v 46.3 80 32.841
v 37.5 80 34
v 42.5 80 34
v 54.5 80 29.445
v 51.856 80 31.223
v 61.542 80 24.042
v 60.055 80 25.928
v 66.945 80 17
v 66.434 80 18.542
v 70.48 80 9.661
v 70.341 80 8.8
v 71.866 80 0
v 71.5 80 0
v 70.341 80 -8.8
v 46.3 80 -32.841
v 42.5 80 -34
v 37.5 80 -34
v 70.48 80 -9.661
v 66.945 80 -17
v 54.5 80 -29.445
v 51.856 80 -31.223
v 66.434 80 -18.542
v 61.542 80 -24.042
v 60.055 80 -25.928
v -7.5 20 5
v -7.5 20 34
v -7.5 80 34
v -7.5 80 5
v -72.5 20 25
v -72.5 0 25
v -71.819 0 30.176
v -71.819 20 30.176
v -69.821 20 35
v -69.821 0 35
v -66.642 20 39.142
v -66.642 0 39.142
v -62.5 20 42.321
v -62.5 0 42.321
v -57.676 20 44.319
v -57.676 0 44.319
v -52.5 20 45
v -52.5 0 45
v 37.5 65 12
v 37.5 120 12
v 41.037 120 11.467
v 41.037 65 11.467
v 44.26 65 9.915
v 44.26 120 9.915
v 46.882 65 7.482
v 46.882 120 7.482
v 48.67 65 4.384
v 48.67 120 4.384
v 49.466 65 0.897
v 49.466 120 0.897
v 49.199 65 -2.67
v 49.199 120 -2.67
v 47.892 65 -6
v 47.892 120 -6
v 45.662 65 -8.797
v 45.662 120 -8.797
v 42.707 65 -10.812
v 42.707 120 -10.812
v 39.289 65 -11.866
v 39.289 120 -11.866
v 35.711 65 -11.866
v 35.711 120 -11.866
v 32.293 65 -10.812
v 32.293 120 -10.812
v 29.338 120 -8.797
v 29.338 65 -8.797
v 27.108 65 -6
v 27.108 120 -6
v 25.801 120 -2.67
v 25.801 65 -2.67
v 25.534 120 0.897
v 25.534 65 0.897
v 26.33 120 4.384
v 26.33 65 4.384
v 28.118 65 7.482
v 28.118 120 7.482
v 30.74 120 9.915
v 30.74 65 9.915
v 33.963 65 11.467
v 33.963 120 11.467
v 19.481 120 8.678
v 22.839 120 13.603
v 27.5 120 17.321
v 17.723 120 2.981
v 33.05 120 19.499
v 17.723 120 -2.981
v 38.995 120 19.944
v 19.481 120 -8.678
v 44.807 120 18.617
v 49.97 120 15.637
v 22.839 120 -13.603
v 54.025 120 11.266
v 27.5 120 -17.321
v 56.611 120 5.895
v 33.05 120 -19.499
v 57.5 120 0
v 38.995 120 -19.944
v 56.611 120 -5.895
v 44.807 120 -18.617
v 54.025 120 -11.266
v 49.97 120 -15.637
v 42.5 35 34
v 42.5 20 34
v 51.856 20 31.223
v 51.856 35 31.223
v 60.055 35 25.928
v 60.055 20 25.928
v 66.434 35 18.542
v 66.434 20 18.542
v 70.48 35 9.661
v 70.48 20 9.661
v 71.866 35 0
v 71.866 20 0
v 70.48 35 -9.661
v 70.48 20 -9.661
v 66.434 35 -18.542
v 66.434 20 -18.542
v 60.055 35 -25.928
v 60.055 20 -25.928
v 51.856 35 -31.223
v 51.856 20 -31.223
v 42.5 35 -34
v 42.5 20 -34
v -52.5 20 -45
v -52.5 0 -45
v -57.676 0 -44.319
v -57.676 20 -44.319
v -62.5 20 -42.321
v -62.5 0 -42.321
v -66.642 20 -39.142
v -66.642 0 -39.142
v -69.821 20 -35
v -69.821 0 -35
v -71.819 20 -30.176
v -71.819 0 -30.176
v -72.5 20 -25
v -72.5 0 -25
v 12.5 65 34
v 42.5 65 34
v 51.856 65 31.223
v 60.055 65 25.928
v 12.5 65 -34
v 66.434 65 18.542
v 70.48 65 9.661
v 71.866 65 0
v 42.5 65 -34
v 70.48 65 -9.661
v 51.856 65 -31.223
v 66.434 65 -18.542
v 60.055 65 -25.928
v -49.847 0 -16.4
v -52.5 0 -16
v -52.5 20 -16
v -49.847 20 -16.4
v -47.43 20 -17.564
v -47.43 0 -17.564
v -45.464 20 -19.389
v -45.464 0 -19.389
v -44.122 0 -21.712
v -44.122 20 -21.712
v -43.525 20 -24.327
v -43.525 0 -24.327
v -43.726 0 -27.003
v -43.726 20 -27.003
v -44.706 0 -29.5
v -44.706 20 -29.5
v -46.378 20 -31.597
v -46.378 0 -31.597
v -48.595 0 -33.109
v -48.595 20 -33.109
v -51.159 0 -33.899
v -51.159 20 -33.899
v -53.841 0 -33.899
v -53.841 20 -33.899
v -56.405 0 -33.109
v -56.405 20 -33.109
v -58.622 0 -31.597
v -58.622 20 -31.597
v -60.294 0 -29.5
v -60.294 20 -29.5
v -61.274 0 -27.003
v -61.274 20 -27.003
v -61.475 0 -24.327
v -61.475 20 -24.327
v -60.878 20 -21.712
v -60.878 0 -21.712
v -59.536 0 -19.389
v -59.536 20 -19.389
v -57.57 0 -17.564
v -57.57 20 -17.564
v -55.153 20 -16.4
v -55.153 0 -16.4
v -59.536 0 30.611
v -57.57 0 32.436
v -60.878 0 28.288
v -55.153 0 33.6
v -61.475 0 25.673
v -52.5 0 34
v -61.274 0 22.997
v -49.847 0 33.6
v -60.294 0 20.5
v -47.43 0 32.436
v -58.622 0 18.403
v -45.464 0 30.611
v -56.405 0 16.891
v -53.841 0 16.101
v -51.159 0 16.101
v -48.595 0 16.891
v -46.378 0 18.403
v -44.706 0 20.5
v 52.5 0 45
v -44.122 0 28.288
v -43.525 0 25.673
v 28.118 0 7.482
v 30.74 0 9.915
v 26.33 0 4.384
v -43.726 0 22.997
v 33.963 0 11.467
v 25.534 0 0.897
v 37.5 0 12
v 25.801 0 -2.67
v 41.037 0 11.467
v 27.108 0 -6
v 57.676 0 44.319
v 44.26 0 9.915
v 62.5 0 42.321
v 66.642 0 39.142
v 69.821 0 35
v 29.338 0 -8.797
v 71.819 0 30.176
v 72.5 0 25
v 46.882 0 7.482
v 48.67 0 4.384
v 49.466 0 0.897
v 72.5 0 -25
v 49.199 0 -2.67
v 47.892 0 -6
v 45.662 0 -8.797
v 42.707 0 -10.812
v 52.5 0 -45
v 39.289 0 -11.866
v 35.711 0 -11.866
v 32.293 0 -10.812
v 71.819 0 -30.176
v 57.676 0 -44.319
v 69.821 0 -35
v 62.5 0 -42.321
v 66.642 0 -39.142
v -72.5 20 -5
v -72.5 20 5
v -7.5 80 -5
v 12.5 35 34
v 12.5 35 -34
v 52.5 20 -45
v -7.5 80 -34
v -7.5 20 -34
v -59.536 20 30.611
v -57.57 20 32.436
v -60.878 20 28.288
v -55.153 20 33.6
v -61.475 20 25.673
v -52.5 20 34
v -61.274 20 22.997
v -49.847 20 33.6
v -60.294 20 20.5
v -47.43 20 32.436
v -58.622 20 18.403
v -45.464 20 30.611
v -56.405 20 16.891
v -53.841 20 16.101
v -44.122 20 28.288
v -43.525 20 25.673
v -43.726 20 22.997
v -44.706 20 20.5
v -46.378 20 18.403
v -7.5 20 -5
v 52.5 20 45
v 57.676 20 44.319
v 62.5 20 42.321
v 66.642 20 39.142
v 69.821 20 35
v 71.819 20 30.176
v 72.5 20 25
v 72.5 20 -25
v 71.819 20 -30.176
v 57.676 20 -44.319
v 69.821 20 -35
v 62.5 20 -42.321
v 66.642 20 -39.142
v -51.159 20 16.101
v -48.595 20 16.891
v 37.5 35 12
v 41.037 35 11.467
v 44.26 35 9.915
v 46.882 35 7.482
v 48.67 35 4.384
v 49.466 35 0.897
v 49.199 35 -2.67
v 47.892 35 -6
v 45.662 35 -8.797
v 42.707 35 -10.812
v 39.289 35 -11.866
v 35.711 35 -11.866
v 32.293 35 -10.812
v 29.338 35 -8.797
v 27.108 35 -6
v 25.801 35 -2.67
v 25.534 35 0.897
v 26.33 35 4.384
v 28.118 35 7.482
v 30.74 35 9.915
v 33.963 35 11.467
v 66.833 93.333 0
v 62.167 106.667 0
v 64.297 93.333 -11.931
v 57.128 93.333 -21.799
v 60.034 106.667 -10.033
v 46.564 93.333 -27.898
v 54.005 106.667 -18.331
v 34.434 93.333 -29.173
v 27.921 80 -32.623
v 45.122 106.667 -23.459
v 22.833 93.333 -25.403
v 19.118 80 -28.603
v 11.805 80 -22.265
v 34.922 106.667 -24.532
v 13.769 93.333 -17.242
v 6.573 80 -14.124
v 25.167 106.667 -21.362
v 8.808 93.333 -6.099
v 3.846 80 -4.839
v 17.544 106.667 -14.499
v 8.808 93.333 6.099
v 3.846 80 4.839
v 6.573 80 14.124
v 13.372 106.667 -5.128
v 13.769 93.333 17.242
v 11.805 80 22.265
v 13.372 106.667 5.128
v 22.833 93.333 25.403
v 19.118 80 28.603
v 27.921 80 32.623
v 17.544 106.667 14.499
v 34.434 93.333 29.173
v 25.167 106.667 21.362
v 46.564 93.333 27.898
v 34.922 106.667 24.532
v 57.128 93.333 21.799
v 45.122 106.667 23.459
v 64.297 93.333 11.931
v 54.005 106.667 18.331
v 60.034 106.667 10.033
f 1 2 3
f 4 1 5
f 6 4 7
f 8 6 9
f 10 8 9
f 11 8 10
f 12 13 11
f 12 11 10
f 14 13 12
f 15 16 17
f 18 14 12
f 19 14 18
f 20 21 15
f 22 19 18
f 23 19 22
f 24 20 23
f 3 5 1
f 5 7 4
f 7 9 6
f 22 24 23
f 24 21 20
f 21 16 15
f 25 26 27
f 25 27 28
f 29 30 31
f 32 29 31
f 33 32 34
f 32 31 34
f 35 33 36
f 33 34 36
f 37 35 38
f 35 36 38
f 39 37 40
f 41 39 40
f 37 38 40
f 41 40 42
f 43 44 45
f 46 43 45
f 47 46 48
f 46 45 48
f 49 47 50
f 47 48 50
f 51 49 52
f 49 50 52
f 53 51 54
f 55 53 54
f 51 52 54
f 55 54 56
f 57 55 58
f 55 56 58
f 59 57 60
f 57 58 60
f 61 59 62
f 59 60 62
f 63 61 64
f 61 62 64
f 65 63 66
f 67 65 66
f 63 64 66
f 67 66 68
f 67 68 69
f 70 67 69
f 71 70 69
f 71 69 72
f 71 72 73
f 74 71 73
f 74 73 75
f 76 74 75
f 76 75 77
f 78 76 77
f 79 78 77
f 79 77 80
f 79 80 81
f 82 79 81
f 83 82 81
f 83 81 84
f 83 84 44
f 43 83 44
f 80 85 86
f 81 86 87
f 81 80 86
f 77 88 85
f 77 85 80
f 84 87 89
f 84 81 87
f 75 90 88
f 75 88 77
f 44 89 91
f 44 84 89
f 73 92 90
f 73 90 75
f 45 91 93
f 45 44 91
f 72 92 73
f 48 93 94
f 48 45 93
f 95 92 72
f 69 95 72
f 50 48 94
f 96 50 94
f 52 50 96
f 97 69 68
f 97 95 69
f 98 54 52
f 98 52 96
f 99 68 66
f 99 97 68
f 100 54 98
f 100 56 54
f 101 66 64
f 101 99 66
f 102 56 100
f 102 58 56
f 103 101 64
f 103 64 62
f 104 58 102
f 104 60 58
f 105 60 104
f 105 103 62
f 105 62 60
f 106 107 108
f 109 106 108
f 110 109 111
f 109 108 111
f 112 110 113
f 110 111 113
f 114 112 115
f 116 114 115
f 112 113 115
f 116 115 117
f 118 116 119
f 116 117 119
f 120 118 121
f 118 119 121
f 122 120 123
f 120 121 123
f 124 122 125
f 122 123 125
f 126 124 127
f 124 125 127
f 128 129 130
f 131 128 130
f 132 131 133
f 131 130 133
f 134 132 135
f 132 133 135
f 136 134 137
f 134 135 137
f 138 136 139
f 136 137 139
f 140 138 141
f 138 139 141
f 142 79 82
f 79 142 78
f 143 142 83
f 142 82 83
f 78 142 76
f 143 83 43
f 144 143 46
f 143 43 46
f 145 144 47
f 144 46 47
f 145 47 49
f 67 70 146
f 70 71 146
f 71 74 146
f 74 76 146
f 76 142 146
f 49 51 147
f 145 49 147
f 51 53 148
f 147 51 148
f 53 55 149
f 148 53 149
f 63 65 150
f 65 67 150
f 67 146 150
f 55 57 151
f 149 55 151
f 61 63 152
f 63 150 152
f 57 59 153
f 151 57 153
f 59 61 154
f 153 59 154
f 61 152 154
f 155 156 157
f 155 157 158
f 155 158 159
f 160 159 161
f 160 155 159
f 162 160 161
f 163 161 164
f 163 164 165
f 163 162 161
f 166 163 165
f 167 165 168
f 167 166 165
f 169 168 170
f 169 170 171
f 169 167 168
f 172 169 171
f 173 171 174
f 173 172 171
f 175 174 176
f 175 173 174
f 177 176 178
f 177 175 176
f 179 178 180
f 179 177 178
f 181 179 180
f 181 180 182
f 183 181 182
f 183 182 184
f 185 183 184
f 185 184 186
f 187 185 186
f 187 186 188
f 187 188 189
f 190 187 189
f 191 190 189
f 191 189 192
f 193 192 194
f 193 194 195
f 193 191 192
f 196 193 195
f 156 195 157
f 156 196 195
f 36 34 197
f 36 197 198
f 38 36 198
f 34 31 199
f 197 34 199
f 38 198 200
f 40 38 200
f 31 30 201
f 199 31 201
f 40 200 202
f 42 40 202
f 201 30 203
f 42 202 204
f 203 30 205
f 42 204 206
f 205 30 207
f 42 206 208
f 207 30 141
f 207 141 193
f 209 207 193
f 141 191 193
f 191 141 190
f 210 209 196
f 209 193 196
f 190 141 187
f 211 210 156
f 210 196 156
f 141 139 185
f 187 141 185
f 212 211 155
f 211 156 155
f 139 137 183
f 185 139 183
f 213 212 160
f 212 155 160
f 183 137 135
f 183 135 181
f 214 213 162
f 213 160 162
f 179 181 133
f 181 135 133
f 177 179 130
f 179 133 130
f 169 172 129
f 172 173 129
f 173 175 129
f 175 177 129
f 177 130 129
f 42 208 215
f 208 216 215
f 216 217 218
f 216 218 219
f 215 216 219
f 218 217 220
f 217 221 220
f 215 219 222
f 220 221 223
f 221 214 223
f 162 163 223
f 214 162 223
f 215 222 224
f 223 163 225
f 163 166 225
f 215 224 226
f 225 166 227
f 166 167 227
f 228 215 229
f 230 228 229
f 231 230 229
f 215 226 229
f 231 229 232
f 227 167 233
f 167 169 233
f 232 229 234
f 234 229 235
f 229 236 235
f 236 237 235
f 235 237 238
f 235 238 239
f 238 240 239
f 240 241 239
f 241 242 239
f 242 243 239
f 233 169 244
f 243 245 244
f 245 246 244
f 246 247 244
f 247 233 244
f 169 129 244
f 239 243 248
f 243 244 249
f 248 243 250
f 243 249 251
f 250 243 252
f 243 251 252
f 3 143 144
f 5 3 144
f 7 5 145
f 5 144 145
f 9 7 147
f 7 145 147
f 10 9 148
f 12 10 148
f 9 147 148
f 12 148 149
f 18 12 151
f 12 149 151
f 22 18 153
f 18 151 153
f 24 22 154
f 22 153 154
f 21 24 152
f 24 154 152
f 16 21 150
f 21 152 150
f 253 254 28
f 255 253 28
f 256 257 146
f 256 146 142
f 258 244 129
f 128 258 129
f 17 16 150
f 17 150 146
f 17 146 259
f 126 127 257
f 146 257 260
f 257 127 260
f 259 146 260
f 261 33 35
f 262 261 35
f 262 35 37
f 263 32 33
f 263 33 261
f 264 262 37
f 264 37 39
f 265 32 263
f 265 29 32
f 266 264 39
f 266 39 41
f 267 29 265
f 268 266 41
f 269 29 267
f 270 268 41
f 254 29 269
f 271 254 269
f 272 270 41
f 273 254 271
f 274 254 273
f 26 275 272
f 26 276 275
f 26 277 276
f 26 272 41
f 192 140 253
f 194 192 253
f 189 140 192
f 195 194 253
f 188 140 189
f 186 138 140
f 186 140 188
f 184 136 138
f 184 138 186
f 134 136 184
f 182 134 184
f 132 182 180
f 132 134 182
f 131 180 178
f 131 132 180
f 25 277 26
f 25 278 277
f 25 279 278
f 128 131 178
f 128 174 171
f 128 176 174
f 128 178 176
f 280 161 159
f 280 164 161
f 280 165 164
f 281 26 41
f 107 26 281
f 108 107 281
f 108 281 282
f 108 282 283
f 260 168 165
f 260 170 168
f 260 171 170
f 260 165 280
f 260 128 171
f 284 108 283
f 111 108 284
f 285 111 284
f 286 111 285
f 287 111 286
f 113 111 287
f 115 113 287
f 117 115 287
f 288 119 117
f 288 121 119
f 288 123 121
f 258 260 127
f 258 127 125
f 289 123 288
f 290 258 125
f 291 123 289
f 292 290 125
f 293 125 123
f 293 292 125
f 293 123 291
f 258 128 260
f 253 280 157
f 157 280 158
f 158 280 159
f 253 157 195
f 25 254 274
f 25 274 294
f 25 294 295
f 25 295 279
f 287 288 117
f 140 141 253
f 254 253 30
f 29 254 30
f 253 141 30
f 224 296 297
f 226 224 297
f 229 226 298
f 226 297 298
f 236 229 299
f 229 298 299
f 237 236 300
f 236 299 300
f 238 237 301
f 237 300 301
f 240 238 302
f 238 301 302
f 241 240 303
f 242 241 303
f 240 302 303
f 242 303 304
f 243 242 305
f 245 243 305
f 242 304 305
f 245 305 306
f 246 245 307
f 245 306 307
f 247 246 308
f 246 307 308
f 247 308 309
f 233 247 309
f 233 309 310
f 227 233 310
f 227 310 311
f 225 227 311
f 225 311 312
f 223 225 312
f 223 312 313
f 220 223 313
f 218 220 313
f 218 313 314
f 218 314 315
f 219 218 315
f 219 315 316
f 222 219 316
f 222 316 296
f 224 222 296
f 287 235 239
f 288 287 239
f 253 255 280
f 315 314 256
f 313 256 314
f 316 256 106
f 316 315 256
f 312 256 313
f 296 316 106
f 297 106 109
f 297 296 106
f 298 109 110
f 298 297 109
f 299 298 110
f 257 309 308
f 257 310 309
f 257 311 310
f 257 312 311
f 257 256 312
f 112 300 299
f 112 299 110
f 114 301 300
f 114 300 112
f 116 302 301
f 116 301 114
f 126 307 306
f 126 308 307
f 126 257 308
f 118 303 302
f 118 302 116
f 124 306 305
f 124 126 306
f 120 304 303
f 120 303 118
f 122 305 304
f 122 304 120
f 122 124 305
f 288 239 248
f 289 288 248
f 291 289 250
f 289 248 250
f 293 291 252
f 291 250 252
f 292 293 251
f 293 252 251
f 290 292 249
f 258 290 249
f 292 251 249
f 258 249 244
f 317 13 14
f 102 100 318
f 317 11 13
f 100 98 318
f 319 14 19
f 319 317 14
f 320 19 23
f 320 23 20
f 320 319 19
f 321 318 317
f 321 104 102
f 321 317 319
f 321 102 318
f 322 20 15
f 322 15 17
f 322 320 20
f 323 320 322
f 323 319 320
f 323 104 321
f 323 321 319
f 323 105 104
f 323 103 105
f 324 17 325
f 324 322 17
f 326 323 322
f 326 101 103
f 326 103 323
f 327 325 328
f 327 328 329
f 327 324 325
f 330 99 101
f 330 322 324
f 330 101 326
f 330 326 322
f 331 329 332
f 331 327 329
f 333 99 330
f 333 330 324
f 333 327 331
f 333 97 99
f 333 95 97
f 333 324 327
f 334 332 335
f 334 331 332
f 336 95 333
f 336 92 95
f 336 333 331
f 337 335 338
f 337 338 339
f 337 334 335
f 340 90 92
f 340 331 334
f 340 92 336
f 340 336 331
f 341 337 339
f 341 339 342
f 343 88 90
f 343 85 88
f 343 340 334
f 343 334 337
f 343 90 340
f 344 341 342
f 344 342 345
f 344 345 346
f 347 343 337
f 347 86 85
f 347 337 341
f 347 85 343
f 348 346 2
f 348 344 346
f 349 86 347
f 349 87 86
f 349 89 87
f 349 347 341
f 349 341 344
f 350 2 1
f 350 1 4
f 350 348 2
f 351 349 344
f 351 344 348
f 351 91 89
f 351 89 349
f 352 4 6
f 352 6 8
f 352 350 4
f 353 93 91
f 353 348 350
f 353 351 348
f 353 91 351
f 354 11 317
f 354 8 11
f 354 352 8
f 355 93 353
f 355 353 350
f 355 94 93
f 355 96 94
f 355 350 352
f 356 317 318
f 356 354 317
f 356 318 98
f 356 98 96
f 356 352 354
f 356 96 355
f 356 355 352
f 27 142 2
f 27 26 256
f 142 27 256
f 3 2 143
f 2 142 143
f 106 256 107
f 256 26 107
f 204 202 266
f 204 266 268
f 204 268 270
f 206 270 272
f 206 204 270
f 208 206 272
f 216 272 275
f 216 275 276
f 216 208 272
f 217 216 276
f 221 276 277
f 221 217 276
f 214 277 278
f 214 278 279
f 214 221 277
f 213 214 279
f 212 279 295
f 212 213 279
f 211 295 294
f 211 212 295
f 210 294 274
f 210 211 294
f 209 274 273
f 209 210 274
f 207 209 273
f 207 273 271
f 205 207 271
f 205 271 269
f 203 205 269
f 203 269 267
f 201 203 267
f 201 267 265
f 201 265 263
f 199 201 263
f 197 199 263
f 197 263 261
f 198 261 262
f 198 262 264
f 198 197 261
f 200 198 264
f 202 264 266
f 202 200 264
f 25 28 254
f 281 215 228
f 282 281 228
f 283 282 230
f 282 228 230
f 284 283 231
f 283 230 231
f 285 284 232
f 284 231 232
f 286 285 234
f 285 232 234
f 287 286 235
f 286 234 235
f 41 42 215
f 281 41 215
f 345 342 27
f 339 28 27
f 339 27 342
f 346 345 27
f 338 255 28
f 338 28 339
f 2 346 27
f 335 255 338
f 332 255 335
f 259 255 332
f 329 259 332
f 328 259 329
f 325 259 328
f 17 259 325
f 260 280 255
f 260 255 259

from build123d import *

# Parameters (mm, degrees)
SKETCH1_R           = 9
BOSS_EXTRUDE1_DEPTH = 20
BOSS_EXTRUDE5_DEPTH = 60
BOSS_EXTRUDE8_DEPTH = 60
SKETCH23_R          = 34
SKETCH24_R          = 20
SKETCH25_R          = 12
CUT_EXTRUDE12_DEPTH = 148.245543226
CUT_EXTRUDE13_START = 15
CUT_EXTRUDE13_DEPTH = 30
BOSS_EXTRUDE9_DEPTH = 5


with BuildPart() as part:
    # Sketch1 → Boss-Extrude1 (new body)
    with BuildSketch(Plane(origin=(0, 0, 0), x_dir=(1, 0, 0), z_dir=(0, 1, 0))):
        with BuildLine():
            Line((52.5, 45), (-52.5, 45))
            ThreePointArc((-52.5, 45), (-66.642135624, 39.142135624), (-72.5, 25))
            Line((-72.5, 25), (-72.5, -25))
            ThreePointArc((-72.5, -25), (-66.642135624, -39.142135624), (-52.5, -45))
            Line((-52.5, -45), (52.5, -45))
            ThreePointArc((52.5, -45), (66.642135624, -39.142135624), (72.5, -25))
            Line((72.5, -25), (72.5, 25))
            ThreePointArc((72.5, 25), (66.642135624, 39.142135624), (52.5, 45))
        make_face()
        with Locations((-52.5, 25)):
            Circle(SKETCH1_R, mode=Mode.SUBTRACT)
        with Locations((-52.5, -25)):
            Circle(SKETCH1_R, mode=Mode.SUBTRACT)
    extrude(amount=BOSS_EXTRUDE1_DEPTH)

    # Sketch2 → Boss-Extrude5 (add)
    with BuildSketch(Plane(origin=(0, 20, 0), x_dir=(1, 0, 0), z_dir=(0, 1, 0))):
        Polygon((12.5, 34), (-7.5, 34), (-7.5, 3.870420596), (-7.5, 0), (-7.5, -34), (12.5, -34), align=None)
    extrude(amount=BOSS_EXTRUDE5_DEPTH)

    # Sketch7 → Boss-Extrude8 (add)
    with BuildSketch(Plane(origin=(0, 20, 0), x_dir=(1, 0, 0), z_dir=(0, 1, 0))):
        with BuildLine():
            Line((12.5, -34), (42.5, -34))
            ThreePointArc((42.5, -34), (71.865680555, 0), (42.5, 34))
            Line((42.5, 34), (12.5, 34))
            Line((12.5, 34), (12.5, -34))
        make_face()
    extrude(amount=BOSS_EXTRUDE8_DEPTH)

    # Sketch23 → Loft1 section 0
    with BuildSketch(Plane(origin=(0, 80, 0), x_dir=(1, 0, 0), z_dir=(0, 1, 0))):
        with Locations((37.5, 0)):
            Circle(SKETCH23_R)
    # Sketch24 → Loft1 section 1
    with BuildSketch(Plane(origin=(0, 120, 0), x_dir=(1, 0, 0), z_dir=(0, 1, 0))):
        with Locations((37.5, 0)):
            Circle(SKETCH24_R)
    loft()

    # Sketch25 → Cut-Extrude12 (cut, through all)
    with BuildSketch(Plane(origin=(0, 120, 0), x_dir=(1, 0, 0), z_dir=(0, 1, 0))):
        with Locations((37.5, 0)):
            Circle(SKETCH25_R)
    extrude(amount=-CUT_EXTRUDE12_DEPTH, mode=Mode.SUBTRACT)

    # Sketch7<2> → Cut-Extrude13 (cut)
    with BuildSketch(Plane(origin=(0, 20, 0), x_dir=(1, 0, 0), z_dir=(0, 1, 0)).offset(CUT_EXTRUDE13_START)):
        with BuildLine():
            Line((12.5, -34), (42.5, -34))
            ThreePointArc((42.5, -34), (71.865680555, 0), (42.5, 34))
            Line((42.5, 34), (12.5, 34))
            Line((12.5, 34), (12.5, -34))
        make_face()
    extrude(amount=CUT_EXTRUDE13_DEPTH, mode=Mode.SUBTRACT)

    # Sketch27 → Boss-Extrude9 (add, symmetric)
    with BuildSketch(Plane.XY):
        Polygon((-7.5, 80), (-7.5, 20), (-72.5, 20), align=None)
    extrude(amount=BOSS_EXTRUDE9_DEPTH, both=True)


solid = part.part
